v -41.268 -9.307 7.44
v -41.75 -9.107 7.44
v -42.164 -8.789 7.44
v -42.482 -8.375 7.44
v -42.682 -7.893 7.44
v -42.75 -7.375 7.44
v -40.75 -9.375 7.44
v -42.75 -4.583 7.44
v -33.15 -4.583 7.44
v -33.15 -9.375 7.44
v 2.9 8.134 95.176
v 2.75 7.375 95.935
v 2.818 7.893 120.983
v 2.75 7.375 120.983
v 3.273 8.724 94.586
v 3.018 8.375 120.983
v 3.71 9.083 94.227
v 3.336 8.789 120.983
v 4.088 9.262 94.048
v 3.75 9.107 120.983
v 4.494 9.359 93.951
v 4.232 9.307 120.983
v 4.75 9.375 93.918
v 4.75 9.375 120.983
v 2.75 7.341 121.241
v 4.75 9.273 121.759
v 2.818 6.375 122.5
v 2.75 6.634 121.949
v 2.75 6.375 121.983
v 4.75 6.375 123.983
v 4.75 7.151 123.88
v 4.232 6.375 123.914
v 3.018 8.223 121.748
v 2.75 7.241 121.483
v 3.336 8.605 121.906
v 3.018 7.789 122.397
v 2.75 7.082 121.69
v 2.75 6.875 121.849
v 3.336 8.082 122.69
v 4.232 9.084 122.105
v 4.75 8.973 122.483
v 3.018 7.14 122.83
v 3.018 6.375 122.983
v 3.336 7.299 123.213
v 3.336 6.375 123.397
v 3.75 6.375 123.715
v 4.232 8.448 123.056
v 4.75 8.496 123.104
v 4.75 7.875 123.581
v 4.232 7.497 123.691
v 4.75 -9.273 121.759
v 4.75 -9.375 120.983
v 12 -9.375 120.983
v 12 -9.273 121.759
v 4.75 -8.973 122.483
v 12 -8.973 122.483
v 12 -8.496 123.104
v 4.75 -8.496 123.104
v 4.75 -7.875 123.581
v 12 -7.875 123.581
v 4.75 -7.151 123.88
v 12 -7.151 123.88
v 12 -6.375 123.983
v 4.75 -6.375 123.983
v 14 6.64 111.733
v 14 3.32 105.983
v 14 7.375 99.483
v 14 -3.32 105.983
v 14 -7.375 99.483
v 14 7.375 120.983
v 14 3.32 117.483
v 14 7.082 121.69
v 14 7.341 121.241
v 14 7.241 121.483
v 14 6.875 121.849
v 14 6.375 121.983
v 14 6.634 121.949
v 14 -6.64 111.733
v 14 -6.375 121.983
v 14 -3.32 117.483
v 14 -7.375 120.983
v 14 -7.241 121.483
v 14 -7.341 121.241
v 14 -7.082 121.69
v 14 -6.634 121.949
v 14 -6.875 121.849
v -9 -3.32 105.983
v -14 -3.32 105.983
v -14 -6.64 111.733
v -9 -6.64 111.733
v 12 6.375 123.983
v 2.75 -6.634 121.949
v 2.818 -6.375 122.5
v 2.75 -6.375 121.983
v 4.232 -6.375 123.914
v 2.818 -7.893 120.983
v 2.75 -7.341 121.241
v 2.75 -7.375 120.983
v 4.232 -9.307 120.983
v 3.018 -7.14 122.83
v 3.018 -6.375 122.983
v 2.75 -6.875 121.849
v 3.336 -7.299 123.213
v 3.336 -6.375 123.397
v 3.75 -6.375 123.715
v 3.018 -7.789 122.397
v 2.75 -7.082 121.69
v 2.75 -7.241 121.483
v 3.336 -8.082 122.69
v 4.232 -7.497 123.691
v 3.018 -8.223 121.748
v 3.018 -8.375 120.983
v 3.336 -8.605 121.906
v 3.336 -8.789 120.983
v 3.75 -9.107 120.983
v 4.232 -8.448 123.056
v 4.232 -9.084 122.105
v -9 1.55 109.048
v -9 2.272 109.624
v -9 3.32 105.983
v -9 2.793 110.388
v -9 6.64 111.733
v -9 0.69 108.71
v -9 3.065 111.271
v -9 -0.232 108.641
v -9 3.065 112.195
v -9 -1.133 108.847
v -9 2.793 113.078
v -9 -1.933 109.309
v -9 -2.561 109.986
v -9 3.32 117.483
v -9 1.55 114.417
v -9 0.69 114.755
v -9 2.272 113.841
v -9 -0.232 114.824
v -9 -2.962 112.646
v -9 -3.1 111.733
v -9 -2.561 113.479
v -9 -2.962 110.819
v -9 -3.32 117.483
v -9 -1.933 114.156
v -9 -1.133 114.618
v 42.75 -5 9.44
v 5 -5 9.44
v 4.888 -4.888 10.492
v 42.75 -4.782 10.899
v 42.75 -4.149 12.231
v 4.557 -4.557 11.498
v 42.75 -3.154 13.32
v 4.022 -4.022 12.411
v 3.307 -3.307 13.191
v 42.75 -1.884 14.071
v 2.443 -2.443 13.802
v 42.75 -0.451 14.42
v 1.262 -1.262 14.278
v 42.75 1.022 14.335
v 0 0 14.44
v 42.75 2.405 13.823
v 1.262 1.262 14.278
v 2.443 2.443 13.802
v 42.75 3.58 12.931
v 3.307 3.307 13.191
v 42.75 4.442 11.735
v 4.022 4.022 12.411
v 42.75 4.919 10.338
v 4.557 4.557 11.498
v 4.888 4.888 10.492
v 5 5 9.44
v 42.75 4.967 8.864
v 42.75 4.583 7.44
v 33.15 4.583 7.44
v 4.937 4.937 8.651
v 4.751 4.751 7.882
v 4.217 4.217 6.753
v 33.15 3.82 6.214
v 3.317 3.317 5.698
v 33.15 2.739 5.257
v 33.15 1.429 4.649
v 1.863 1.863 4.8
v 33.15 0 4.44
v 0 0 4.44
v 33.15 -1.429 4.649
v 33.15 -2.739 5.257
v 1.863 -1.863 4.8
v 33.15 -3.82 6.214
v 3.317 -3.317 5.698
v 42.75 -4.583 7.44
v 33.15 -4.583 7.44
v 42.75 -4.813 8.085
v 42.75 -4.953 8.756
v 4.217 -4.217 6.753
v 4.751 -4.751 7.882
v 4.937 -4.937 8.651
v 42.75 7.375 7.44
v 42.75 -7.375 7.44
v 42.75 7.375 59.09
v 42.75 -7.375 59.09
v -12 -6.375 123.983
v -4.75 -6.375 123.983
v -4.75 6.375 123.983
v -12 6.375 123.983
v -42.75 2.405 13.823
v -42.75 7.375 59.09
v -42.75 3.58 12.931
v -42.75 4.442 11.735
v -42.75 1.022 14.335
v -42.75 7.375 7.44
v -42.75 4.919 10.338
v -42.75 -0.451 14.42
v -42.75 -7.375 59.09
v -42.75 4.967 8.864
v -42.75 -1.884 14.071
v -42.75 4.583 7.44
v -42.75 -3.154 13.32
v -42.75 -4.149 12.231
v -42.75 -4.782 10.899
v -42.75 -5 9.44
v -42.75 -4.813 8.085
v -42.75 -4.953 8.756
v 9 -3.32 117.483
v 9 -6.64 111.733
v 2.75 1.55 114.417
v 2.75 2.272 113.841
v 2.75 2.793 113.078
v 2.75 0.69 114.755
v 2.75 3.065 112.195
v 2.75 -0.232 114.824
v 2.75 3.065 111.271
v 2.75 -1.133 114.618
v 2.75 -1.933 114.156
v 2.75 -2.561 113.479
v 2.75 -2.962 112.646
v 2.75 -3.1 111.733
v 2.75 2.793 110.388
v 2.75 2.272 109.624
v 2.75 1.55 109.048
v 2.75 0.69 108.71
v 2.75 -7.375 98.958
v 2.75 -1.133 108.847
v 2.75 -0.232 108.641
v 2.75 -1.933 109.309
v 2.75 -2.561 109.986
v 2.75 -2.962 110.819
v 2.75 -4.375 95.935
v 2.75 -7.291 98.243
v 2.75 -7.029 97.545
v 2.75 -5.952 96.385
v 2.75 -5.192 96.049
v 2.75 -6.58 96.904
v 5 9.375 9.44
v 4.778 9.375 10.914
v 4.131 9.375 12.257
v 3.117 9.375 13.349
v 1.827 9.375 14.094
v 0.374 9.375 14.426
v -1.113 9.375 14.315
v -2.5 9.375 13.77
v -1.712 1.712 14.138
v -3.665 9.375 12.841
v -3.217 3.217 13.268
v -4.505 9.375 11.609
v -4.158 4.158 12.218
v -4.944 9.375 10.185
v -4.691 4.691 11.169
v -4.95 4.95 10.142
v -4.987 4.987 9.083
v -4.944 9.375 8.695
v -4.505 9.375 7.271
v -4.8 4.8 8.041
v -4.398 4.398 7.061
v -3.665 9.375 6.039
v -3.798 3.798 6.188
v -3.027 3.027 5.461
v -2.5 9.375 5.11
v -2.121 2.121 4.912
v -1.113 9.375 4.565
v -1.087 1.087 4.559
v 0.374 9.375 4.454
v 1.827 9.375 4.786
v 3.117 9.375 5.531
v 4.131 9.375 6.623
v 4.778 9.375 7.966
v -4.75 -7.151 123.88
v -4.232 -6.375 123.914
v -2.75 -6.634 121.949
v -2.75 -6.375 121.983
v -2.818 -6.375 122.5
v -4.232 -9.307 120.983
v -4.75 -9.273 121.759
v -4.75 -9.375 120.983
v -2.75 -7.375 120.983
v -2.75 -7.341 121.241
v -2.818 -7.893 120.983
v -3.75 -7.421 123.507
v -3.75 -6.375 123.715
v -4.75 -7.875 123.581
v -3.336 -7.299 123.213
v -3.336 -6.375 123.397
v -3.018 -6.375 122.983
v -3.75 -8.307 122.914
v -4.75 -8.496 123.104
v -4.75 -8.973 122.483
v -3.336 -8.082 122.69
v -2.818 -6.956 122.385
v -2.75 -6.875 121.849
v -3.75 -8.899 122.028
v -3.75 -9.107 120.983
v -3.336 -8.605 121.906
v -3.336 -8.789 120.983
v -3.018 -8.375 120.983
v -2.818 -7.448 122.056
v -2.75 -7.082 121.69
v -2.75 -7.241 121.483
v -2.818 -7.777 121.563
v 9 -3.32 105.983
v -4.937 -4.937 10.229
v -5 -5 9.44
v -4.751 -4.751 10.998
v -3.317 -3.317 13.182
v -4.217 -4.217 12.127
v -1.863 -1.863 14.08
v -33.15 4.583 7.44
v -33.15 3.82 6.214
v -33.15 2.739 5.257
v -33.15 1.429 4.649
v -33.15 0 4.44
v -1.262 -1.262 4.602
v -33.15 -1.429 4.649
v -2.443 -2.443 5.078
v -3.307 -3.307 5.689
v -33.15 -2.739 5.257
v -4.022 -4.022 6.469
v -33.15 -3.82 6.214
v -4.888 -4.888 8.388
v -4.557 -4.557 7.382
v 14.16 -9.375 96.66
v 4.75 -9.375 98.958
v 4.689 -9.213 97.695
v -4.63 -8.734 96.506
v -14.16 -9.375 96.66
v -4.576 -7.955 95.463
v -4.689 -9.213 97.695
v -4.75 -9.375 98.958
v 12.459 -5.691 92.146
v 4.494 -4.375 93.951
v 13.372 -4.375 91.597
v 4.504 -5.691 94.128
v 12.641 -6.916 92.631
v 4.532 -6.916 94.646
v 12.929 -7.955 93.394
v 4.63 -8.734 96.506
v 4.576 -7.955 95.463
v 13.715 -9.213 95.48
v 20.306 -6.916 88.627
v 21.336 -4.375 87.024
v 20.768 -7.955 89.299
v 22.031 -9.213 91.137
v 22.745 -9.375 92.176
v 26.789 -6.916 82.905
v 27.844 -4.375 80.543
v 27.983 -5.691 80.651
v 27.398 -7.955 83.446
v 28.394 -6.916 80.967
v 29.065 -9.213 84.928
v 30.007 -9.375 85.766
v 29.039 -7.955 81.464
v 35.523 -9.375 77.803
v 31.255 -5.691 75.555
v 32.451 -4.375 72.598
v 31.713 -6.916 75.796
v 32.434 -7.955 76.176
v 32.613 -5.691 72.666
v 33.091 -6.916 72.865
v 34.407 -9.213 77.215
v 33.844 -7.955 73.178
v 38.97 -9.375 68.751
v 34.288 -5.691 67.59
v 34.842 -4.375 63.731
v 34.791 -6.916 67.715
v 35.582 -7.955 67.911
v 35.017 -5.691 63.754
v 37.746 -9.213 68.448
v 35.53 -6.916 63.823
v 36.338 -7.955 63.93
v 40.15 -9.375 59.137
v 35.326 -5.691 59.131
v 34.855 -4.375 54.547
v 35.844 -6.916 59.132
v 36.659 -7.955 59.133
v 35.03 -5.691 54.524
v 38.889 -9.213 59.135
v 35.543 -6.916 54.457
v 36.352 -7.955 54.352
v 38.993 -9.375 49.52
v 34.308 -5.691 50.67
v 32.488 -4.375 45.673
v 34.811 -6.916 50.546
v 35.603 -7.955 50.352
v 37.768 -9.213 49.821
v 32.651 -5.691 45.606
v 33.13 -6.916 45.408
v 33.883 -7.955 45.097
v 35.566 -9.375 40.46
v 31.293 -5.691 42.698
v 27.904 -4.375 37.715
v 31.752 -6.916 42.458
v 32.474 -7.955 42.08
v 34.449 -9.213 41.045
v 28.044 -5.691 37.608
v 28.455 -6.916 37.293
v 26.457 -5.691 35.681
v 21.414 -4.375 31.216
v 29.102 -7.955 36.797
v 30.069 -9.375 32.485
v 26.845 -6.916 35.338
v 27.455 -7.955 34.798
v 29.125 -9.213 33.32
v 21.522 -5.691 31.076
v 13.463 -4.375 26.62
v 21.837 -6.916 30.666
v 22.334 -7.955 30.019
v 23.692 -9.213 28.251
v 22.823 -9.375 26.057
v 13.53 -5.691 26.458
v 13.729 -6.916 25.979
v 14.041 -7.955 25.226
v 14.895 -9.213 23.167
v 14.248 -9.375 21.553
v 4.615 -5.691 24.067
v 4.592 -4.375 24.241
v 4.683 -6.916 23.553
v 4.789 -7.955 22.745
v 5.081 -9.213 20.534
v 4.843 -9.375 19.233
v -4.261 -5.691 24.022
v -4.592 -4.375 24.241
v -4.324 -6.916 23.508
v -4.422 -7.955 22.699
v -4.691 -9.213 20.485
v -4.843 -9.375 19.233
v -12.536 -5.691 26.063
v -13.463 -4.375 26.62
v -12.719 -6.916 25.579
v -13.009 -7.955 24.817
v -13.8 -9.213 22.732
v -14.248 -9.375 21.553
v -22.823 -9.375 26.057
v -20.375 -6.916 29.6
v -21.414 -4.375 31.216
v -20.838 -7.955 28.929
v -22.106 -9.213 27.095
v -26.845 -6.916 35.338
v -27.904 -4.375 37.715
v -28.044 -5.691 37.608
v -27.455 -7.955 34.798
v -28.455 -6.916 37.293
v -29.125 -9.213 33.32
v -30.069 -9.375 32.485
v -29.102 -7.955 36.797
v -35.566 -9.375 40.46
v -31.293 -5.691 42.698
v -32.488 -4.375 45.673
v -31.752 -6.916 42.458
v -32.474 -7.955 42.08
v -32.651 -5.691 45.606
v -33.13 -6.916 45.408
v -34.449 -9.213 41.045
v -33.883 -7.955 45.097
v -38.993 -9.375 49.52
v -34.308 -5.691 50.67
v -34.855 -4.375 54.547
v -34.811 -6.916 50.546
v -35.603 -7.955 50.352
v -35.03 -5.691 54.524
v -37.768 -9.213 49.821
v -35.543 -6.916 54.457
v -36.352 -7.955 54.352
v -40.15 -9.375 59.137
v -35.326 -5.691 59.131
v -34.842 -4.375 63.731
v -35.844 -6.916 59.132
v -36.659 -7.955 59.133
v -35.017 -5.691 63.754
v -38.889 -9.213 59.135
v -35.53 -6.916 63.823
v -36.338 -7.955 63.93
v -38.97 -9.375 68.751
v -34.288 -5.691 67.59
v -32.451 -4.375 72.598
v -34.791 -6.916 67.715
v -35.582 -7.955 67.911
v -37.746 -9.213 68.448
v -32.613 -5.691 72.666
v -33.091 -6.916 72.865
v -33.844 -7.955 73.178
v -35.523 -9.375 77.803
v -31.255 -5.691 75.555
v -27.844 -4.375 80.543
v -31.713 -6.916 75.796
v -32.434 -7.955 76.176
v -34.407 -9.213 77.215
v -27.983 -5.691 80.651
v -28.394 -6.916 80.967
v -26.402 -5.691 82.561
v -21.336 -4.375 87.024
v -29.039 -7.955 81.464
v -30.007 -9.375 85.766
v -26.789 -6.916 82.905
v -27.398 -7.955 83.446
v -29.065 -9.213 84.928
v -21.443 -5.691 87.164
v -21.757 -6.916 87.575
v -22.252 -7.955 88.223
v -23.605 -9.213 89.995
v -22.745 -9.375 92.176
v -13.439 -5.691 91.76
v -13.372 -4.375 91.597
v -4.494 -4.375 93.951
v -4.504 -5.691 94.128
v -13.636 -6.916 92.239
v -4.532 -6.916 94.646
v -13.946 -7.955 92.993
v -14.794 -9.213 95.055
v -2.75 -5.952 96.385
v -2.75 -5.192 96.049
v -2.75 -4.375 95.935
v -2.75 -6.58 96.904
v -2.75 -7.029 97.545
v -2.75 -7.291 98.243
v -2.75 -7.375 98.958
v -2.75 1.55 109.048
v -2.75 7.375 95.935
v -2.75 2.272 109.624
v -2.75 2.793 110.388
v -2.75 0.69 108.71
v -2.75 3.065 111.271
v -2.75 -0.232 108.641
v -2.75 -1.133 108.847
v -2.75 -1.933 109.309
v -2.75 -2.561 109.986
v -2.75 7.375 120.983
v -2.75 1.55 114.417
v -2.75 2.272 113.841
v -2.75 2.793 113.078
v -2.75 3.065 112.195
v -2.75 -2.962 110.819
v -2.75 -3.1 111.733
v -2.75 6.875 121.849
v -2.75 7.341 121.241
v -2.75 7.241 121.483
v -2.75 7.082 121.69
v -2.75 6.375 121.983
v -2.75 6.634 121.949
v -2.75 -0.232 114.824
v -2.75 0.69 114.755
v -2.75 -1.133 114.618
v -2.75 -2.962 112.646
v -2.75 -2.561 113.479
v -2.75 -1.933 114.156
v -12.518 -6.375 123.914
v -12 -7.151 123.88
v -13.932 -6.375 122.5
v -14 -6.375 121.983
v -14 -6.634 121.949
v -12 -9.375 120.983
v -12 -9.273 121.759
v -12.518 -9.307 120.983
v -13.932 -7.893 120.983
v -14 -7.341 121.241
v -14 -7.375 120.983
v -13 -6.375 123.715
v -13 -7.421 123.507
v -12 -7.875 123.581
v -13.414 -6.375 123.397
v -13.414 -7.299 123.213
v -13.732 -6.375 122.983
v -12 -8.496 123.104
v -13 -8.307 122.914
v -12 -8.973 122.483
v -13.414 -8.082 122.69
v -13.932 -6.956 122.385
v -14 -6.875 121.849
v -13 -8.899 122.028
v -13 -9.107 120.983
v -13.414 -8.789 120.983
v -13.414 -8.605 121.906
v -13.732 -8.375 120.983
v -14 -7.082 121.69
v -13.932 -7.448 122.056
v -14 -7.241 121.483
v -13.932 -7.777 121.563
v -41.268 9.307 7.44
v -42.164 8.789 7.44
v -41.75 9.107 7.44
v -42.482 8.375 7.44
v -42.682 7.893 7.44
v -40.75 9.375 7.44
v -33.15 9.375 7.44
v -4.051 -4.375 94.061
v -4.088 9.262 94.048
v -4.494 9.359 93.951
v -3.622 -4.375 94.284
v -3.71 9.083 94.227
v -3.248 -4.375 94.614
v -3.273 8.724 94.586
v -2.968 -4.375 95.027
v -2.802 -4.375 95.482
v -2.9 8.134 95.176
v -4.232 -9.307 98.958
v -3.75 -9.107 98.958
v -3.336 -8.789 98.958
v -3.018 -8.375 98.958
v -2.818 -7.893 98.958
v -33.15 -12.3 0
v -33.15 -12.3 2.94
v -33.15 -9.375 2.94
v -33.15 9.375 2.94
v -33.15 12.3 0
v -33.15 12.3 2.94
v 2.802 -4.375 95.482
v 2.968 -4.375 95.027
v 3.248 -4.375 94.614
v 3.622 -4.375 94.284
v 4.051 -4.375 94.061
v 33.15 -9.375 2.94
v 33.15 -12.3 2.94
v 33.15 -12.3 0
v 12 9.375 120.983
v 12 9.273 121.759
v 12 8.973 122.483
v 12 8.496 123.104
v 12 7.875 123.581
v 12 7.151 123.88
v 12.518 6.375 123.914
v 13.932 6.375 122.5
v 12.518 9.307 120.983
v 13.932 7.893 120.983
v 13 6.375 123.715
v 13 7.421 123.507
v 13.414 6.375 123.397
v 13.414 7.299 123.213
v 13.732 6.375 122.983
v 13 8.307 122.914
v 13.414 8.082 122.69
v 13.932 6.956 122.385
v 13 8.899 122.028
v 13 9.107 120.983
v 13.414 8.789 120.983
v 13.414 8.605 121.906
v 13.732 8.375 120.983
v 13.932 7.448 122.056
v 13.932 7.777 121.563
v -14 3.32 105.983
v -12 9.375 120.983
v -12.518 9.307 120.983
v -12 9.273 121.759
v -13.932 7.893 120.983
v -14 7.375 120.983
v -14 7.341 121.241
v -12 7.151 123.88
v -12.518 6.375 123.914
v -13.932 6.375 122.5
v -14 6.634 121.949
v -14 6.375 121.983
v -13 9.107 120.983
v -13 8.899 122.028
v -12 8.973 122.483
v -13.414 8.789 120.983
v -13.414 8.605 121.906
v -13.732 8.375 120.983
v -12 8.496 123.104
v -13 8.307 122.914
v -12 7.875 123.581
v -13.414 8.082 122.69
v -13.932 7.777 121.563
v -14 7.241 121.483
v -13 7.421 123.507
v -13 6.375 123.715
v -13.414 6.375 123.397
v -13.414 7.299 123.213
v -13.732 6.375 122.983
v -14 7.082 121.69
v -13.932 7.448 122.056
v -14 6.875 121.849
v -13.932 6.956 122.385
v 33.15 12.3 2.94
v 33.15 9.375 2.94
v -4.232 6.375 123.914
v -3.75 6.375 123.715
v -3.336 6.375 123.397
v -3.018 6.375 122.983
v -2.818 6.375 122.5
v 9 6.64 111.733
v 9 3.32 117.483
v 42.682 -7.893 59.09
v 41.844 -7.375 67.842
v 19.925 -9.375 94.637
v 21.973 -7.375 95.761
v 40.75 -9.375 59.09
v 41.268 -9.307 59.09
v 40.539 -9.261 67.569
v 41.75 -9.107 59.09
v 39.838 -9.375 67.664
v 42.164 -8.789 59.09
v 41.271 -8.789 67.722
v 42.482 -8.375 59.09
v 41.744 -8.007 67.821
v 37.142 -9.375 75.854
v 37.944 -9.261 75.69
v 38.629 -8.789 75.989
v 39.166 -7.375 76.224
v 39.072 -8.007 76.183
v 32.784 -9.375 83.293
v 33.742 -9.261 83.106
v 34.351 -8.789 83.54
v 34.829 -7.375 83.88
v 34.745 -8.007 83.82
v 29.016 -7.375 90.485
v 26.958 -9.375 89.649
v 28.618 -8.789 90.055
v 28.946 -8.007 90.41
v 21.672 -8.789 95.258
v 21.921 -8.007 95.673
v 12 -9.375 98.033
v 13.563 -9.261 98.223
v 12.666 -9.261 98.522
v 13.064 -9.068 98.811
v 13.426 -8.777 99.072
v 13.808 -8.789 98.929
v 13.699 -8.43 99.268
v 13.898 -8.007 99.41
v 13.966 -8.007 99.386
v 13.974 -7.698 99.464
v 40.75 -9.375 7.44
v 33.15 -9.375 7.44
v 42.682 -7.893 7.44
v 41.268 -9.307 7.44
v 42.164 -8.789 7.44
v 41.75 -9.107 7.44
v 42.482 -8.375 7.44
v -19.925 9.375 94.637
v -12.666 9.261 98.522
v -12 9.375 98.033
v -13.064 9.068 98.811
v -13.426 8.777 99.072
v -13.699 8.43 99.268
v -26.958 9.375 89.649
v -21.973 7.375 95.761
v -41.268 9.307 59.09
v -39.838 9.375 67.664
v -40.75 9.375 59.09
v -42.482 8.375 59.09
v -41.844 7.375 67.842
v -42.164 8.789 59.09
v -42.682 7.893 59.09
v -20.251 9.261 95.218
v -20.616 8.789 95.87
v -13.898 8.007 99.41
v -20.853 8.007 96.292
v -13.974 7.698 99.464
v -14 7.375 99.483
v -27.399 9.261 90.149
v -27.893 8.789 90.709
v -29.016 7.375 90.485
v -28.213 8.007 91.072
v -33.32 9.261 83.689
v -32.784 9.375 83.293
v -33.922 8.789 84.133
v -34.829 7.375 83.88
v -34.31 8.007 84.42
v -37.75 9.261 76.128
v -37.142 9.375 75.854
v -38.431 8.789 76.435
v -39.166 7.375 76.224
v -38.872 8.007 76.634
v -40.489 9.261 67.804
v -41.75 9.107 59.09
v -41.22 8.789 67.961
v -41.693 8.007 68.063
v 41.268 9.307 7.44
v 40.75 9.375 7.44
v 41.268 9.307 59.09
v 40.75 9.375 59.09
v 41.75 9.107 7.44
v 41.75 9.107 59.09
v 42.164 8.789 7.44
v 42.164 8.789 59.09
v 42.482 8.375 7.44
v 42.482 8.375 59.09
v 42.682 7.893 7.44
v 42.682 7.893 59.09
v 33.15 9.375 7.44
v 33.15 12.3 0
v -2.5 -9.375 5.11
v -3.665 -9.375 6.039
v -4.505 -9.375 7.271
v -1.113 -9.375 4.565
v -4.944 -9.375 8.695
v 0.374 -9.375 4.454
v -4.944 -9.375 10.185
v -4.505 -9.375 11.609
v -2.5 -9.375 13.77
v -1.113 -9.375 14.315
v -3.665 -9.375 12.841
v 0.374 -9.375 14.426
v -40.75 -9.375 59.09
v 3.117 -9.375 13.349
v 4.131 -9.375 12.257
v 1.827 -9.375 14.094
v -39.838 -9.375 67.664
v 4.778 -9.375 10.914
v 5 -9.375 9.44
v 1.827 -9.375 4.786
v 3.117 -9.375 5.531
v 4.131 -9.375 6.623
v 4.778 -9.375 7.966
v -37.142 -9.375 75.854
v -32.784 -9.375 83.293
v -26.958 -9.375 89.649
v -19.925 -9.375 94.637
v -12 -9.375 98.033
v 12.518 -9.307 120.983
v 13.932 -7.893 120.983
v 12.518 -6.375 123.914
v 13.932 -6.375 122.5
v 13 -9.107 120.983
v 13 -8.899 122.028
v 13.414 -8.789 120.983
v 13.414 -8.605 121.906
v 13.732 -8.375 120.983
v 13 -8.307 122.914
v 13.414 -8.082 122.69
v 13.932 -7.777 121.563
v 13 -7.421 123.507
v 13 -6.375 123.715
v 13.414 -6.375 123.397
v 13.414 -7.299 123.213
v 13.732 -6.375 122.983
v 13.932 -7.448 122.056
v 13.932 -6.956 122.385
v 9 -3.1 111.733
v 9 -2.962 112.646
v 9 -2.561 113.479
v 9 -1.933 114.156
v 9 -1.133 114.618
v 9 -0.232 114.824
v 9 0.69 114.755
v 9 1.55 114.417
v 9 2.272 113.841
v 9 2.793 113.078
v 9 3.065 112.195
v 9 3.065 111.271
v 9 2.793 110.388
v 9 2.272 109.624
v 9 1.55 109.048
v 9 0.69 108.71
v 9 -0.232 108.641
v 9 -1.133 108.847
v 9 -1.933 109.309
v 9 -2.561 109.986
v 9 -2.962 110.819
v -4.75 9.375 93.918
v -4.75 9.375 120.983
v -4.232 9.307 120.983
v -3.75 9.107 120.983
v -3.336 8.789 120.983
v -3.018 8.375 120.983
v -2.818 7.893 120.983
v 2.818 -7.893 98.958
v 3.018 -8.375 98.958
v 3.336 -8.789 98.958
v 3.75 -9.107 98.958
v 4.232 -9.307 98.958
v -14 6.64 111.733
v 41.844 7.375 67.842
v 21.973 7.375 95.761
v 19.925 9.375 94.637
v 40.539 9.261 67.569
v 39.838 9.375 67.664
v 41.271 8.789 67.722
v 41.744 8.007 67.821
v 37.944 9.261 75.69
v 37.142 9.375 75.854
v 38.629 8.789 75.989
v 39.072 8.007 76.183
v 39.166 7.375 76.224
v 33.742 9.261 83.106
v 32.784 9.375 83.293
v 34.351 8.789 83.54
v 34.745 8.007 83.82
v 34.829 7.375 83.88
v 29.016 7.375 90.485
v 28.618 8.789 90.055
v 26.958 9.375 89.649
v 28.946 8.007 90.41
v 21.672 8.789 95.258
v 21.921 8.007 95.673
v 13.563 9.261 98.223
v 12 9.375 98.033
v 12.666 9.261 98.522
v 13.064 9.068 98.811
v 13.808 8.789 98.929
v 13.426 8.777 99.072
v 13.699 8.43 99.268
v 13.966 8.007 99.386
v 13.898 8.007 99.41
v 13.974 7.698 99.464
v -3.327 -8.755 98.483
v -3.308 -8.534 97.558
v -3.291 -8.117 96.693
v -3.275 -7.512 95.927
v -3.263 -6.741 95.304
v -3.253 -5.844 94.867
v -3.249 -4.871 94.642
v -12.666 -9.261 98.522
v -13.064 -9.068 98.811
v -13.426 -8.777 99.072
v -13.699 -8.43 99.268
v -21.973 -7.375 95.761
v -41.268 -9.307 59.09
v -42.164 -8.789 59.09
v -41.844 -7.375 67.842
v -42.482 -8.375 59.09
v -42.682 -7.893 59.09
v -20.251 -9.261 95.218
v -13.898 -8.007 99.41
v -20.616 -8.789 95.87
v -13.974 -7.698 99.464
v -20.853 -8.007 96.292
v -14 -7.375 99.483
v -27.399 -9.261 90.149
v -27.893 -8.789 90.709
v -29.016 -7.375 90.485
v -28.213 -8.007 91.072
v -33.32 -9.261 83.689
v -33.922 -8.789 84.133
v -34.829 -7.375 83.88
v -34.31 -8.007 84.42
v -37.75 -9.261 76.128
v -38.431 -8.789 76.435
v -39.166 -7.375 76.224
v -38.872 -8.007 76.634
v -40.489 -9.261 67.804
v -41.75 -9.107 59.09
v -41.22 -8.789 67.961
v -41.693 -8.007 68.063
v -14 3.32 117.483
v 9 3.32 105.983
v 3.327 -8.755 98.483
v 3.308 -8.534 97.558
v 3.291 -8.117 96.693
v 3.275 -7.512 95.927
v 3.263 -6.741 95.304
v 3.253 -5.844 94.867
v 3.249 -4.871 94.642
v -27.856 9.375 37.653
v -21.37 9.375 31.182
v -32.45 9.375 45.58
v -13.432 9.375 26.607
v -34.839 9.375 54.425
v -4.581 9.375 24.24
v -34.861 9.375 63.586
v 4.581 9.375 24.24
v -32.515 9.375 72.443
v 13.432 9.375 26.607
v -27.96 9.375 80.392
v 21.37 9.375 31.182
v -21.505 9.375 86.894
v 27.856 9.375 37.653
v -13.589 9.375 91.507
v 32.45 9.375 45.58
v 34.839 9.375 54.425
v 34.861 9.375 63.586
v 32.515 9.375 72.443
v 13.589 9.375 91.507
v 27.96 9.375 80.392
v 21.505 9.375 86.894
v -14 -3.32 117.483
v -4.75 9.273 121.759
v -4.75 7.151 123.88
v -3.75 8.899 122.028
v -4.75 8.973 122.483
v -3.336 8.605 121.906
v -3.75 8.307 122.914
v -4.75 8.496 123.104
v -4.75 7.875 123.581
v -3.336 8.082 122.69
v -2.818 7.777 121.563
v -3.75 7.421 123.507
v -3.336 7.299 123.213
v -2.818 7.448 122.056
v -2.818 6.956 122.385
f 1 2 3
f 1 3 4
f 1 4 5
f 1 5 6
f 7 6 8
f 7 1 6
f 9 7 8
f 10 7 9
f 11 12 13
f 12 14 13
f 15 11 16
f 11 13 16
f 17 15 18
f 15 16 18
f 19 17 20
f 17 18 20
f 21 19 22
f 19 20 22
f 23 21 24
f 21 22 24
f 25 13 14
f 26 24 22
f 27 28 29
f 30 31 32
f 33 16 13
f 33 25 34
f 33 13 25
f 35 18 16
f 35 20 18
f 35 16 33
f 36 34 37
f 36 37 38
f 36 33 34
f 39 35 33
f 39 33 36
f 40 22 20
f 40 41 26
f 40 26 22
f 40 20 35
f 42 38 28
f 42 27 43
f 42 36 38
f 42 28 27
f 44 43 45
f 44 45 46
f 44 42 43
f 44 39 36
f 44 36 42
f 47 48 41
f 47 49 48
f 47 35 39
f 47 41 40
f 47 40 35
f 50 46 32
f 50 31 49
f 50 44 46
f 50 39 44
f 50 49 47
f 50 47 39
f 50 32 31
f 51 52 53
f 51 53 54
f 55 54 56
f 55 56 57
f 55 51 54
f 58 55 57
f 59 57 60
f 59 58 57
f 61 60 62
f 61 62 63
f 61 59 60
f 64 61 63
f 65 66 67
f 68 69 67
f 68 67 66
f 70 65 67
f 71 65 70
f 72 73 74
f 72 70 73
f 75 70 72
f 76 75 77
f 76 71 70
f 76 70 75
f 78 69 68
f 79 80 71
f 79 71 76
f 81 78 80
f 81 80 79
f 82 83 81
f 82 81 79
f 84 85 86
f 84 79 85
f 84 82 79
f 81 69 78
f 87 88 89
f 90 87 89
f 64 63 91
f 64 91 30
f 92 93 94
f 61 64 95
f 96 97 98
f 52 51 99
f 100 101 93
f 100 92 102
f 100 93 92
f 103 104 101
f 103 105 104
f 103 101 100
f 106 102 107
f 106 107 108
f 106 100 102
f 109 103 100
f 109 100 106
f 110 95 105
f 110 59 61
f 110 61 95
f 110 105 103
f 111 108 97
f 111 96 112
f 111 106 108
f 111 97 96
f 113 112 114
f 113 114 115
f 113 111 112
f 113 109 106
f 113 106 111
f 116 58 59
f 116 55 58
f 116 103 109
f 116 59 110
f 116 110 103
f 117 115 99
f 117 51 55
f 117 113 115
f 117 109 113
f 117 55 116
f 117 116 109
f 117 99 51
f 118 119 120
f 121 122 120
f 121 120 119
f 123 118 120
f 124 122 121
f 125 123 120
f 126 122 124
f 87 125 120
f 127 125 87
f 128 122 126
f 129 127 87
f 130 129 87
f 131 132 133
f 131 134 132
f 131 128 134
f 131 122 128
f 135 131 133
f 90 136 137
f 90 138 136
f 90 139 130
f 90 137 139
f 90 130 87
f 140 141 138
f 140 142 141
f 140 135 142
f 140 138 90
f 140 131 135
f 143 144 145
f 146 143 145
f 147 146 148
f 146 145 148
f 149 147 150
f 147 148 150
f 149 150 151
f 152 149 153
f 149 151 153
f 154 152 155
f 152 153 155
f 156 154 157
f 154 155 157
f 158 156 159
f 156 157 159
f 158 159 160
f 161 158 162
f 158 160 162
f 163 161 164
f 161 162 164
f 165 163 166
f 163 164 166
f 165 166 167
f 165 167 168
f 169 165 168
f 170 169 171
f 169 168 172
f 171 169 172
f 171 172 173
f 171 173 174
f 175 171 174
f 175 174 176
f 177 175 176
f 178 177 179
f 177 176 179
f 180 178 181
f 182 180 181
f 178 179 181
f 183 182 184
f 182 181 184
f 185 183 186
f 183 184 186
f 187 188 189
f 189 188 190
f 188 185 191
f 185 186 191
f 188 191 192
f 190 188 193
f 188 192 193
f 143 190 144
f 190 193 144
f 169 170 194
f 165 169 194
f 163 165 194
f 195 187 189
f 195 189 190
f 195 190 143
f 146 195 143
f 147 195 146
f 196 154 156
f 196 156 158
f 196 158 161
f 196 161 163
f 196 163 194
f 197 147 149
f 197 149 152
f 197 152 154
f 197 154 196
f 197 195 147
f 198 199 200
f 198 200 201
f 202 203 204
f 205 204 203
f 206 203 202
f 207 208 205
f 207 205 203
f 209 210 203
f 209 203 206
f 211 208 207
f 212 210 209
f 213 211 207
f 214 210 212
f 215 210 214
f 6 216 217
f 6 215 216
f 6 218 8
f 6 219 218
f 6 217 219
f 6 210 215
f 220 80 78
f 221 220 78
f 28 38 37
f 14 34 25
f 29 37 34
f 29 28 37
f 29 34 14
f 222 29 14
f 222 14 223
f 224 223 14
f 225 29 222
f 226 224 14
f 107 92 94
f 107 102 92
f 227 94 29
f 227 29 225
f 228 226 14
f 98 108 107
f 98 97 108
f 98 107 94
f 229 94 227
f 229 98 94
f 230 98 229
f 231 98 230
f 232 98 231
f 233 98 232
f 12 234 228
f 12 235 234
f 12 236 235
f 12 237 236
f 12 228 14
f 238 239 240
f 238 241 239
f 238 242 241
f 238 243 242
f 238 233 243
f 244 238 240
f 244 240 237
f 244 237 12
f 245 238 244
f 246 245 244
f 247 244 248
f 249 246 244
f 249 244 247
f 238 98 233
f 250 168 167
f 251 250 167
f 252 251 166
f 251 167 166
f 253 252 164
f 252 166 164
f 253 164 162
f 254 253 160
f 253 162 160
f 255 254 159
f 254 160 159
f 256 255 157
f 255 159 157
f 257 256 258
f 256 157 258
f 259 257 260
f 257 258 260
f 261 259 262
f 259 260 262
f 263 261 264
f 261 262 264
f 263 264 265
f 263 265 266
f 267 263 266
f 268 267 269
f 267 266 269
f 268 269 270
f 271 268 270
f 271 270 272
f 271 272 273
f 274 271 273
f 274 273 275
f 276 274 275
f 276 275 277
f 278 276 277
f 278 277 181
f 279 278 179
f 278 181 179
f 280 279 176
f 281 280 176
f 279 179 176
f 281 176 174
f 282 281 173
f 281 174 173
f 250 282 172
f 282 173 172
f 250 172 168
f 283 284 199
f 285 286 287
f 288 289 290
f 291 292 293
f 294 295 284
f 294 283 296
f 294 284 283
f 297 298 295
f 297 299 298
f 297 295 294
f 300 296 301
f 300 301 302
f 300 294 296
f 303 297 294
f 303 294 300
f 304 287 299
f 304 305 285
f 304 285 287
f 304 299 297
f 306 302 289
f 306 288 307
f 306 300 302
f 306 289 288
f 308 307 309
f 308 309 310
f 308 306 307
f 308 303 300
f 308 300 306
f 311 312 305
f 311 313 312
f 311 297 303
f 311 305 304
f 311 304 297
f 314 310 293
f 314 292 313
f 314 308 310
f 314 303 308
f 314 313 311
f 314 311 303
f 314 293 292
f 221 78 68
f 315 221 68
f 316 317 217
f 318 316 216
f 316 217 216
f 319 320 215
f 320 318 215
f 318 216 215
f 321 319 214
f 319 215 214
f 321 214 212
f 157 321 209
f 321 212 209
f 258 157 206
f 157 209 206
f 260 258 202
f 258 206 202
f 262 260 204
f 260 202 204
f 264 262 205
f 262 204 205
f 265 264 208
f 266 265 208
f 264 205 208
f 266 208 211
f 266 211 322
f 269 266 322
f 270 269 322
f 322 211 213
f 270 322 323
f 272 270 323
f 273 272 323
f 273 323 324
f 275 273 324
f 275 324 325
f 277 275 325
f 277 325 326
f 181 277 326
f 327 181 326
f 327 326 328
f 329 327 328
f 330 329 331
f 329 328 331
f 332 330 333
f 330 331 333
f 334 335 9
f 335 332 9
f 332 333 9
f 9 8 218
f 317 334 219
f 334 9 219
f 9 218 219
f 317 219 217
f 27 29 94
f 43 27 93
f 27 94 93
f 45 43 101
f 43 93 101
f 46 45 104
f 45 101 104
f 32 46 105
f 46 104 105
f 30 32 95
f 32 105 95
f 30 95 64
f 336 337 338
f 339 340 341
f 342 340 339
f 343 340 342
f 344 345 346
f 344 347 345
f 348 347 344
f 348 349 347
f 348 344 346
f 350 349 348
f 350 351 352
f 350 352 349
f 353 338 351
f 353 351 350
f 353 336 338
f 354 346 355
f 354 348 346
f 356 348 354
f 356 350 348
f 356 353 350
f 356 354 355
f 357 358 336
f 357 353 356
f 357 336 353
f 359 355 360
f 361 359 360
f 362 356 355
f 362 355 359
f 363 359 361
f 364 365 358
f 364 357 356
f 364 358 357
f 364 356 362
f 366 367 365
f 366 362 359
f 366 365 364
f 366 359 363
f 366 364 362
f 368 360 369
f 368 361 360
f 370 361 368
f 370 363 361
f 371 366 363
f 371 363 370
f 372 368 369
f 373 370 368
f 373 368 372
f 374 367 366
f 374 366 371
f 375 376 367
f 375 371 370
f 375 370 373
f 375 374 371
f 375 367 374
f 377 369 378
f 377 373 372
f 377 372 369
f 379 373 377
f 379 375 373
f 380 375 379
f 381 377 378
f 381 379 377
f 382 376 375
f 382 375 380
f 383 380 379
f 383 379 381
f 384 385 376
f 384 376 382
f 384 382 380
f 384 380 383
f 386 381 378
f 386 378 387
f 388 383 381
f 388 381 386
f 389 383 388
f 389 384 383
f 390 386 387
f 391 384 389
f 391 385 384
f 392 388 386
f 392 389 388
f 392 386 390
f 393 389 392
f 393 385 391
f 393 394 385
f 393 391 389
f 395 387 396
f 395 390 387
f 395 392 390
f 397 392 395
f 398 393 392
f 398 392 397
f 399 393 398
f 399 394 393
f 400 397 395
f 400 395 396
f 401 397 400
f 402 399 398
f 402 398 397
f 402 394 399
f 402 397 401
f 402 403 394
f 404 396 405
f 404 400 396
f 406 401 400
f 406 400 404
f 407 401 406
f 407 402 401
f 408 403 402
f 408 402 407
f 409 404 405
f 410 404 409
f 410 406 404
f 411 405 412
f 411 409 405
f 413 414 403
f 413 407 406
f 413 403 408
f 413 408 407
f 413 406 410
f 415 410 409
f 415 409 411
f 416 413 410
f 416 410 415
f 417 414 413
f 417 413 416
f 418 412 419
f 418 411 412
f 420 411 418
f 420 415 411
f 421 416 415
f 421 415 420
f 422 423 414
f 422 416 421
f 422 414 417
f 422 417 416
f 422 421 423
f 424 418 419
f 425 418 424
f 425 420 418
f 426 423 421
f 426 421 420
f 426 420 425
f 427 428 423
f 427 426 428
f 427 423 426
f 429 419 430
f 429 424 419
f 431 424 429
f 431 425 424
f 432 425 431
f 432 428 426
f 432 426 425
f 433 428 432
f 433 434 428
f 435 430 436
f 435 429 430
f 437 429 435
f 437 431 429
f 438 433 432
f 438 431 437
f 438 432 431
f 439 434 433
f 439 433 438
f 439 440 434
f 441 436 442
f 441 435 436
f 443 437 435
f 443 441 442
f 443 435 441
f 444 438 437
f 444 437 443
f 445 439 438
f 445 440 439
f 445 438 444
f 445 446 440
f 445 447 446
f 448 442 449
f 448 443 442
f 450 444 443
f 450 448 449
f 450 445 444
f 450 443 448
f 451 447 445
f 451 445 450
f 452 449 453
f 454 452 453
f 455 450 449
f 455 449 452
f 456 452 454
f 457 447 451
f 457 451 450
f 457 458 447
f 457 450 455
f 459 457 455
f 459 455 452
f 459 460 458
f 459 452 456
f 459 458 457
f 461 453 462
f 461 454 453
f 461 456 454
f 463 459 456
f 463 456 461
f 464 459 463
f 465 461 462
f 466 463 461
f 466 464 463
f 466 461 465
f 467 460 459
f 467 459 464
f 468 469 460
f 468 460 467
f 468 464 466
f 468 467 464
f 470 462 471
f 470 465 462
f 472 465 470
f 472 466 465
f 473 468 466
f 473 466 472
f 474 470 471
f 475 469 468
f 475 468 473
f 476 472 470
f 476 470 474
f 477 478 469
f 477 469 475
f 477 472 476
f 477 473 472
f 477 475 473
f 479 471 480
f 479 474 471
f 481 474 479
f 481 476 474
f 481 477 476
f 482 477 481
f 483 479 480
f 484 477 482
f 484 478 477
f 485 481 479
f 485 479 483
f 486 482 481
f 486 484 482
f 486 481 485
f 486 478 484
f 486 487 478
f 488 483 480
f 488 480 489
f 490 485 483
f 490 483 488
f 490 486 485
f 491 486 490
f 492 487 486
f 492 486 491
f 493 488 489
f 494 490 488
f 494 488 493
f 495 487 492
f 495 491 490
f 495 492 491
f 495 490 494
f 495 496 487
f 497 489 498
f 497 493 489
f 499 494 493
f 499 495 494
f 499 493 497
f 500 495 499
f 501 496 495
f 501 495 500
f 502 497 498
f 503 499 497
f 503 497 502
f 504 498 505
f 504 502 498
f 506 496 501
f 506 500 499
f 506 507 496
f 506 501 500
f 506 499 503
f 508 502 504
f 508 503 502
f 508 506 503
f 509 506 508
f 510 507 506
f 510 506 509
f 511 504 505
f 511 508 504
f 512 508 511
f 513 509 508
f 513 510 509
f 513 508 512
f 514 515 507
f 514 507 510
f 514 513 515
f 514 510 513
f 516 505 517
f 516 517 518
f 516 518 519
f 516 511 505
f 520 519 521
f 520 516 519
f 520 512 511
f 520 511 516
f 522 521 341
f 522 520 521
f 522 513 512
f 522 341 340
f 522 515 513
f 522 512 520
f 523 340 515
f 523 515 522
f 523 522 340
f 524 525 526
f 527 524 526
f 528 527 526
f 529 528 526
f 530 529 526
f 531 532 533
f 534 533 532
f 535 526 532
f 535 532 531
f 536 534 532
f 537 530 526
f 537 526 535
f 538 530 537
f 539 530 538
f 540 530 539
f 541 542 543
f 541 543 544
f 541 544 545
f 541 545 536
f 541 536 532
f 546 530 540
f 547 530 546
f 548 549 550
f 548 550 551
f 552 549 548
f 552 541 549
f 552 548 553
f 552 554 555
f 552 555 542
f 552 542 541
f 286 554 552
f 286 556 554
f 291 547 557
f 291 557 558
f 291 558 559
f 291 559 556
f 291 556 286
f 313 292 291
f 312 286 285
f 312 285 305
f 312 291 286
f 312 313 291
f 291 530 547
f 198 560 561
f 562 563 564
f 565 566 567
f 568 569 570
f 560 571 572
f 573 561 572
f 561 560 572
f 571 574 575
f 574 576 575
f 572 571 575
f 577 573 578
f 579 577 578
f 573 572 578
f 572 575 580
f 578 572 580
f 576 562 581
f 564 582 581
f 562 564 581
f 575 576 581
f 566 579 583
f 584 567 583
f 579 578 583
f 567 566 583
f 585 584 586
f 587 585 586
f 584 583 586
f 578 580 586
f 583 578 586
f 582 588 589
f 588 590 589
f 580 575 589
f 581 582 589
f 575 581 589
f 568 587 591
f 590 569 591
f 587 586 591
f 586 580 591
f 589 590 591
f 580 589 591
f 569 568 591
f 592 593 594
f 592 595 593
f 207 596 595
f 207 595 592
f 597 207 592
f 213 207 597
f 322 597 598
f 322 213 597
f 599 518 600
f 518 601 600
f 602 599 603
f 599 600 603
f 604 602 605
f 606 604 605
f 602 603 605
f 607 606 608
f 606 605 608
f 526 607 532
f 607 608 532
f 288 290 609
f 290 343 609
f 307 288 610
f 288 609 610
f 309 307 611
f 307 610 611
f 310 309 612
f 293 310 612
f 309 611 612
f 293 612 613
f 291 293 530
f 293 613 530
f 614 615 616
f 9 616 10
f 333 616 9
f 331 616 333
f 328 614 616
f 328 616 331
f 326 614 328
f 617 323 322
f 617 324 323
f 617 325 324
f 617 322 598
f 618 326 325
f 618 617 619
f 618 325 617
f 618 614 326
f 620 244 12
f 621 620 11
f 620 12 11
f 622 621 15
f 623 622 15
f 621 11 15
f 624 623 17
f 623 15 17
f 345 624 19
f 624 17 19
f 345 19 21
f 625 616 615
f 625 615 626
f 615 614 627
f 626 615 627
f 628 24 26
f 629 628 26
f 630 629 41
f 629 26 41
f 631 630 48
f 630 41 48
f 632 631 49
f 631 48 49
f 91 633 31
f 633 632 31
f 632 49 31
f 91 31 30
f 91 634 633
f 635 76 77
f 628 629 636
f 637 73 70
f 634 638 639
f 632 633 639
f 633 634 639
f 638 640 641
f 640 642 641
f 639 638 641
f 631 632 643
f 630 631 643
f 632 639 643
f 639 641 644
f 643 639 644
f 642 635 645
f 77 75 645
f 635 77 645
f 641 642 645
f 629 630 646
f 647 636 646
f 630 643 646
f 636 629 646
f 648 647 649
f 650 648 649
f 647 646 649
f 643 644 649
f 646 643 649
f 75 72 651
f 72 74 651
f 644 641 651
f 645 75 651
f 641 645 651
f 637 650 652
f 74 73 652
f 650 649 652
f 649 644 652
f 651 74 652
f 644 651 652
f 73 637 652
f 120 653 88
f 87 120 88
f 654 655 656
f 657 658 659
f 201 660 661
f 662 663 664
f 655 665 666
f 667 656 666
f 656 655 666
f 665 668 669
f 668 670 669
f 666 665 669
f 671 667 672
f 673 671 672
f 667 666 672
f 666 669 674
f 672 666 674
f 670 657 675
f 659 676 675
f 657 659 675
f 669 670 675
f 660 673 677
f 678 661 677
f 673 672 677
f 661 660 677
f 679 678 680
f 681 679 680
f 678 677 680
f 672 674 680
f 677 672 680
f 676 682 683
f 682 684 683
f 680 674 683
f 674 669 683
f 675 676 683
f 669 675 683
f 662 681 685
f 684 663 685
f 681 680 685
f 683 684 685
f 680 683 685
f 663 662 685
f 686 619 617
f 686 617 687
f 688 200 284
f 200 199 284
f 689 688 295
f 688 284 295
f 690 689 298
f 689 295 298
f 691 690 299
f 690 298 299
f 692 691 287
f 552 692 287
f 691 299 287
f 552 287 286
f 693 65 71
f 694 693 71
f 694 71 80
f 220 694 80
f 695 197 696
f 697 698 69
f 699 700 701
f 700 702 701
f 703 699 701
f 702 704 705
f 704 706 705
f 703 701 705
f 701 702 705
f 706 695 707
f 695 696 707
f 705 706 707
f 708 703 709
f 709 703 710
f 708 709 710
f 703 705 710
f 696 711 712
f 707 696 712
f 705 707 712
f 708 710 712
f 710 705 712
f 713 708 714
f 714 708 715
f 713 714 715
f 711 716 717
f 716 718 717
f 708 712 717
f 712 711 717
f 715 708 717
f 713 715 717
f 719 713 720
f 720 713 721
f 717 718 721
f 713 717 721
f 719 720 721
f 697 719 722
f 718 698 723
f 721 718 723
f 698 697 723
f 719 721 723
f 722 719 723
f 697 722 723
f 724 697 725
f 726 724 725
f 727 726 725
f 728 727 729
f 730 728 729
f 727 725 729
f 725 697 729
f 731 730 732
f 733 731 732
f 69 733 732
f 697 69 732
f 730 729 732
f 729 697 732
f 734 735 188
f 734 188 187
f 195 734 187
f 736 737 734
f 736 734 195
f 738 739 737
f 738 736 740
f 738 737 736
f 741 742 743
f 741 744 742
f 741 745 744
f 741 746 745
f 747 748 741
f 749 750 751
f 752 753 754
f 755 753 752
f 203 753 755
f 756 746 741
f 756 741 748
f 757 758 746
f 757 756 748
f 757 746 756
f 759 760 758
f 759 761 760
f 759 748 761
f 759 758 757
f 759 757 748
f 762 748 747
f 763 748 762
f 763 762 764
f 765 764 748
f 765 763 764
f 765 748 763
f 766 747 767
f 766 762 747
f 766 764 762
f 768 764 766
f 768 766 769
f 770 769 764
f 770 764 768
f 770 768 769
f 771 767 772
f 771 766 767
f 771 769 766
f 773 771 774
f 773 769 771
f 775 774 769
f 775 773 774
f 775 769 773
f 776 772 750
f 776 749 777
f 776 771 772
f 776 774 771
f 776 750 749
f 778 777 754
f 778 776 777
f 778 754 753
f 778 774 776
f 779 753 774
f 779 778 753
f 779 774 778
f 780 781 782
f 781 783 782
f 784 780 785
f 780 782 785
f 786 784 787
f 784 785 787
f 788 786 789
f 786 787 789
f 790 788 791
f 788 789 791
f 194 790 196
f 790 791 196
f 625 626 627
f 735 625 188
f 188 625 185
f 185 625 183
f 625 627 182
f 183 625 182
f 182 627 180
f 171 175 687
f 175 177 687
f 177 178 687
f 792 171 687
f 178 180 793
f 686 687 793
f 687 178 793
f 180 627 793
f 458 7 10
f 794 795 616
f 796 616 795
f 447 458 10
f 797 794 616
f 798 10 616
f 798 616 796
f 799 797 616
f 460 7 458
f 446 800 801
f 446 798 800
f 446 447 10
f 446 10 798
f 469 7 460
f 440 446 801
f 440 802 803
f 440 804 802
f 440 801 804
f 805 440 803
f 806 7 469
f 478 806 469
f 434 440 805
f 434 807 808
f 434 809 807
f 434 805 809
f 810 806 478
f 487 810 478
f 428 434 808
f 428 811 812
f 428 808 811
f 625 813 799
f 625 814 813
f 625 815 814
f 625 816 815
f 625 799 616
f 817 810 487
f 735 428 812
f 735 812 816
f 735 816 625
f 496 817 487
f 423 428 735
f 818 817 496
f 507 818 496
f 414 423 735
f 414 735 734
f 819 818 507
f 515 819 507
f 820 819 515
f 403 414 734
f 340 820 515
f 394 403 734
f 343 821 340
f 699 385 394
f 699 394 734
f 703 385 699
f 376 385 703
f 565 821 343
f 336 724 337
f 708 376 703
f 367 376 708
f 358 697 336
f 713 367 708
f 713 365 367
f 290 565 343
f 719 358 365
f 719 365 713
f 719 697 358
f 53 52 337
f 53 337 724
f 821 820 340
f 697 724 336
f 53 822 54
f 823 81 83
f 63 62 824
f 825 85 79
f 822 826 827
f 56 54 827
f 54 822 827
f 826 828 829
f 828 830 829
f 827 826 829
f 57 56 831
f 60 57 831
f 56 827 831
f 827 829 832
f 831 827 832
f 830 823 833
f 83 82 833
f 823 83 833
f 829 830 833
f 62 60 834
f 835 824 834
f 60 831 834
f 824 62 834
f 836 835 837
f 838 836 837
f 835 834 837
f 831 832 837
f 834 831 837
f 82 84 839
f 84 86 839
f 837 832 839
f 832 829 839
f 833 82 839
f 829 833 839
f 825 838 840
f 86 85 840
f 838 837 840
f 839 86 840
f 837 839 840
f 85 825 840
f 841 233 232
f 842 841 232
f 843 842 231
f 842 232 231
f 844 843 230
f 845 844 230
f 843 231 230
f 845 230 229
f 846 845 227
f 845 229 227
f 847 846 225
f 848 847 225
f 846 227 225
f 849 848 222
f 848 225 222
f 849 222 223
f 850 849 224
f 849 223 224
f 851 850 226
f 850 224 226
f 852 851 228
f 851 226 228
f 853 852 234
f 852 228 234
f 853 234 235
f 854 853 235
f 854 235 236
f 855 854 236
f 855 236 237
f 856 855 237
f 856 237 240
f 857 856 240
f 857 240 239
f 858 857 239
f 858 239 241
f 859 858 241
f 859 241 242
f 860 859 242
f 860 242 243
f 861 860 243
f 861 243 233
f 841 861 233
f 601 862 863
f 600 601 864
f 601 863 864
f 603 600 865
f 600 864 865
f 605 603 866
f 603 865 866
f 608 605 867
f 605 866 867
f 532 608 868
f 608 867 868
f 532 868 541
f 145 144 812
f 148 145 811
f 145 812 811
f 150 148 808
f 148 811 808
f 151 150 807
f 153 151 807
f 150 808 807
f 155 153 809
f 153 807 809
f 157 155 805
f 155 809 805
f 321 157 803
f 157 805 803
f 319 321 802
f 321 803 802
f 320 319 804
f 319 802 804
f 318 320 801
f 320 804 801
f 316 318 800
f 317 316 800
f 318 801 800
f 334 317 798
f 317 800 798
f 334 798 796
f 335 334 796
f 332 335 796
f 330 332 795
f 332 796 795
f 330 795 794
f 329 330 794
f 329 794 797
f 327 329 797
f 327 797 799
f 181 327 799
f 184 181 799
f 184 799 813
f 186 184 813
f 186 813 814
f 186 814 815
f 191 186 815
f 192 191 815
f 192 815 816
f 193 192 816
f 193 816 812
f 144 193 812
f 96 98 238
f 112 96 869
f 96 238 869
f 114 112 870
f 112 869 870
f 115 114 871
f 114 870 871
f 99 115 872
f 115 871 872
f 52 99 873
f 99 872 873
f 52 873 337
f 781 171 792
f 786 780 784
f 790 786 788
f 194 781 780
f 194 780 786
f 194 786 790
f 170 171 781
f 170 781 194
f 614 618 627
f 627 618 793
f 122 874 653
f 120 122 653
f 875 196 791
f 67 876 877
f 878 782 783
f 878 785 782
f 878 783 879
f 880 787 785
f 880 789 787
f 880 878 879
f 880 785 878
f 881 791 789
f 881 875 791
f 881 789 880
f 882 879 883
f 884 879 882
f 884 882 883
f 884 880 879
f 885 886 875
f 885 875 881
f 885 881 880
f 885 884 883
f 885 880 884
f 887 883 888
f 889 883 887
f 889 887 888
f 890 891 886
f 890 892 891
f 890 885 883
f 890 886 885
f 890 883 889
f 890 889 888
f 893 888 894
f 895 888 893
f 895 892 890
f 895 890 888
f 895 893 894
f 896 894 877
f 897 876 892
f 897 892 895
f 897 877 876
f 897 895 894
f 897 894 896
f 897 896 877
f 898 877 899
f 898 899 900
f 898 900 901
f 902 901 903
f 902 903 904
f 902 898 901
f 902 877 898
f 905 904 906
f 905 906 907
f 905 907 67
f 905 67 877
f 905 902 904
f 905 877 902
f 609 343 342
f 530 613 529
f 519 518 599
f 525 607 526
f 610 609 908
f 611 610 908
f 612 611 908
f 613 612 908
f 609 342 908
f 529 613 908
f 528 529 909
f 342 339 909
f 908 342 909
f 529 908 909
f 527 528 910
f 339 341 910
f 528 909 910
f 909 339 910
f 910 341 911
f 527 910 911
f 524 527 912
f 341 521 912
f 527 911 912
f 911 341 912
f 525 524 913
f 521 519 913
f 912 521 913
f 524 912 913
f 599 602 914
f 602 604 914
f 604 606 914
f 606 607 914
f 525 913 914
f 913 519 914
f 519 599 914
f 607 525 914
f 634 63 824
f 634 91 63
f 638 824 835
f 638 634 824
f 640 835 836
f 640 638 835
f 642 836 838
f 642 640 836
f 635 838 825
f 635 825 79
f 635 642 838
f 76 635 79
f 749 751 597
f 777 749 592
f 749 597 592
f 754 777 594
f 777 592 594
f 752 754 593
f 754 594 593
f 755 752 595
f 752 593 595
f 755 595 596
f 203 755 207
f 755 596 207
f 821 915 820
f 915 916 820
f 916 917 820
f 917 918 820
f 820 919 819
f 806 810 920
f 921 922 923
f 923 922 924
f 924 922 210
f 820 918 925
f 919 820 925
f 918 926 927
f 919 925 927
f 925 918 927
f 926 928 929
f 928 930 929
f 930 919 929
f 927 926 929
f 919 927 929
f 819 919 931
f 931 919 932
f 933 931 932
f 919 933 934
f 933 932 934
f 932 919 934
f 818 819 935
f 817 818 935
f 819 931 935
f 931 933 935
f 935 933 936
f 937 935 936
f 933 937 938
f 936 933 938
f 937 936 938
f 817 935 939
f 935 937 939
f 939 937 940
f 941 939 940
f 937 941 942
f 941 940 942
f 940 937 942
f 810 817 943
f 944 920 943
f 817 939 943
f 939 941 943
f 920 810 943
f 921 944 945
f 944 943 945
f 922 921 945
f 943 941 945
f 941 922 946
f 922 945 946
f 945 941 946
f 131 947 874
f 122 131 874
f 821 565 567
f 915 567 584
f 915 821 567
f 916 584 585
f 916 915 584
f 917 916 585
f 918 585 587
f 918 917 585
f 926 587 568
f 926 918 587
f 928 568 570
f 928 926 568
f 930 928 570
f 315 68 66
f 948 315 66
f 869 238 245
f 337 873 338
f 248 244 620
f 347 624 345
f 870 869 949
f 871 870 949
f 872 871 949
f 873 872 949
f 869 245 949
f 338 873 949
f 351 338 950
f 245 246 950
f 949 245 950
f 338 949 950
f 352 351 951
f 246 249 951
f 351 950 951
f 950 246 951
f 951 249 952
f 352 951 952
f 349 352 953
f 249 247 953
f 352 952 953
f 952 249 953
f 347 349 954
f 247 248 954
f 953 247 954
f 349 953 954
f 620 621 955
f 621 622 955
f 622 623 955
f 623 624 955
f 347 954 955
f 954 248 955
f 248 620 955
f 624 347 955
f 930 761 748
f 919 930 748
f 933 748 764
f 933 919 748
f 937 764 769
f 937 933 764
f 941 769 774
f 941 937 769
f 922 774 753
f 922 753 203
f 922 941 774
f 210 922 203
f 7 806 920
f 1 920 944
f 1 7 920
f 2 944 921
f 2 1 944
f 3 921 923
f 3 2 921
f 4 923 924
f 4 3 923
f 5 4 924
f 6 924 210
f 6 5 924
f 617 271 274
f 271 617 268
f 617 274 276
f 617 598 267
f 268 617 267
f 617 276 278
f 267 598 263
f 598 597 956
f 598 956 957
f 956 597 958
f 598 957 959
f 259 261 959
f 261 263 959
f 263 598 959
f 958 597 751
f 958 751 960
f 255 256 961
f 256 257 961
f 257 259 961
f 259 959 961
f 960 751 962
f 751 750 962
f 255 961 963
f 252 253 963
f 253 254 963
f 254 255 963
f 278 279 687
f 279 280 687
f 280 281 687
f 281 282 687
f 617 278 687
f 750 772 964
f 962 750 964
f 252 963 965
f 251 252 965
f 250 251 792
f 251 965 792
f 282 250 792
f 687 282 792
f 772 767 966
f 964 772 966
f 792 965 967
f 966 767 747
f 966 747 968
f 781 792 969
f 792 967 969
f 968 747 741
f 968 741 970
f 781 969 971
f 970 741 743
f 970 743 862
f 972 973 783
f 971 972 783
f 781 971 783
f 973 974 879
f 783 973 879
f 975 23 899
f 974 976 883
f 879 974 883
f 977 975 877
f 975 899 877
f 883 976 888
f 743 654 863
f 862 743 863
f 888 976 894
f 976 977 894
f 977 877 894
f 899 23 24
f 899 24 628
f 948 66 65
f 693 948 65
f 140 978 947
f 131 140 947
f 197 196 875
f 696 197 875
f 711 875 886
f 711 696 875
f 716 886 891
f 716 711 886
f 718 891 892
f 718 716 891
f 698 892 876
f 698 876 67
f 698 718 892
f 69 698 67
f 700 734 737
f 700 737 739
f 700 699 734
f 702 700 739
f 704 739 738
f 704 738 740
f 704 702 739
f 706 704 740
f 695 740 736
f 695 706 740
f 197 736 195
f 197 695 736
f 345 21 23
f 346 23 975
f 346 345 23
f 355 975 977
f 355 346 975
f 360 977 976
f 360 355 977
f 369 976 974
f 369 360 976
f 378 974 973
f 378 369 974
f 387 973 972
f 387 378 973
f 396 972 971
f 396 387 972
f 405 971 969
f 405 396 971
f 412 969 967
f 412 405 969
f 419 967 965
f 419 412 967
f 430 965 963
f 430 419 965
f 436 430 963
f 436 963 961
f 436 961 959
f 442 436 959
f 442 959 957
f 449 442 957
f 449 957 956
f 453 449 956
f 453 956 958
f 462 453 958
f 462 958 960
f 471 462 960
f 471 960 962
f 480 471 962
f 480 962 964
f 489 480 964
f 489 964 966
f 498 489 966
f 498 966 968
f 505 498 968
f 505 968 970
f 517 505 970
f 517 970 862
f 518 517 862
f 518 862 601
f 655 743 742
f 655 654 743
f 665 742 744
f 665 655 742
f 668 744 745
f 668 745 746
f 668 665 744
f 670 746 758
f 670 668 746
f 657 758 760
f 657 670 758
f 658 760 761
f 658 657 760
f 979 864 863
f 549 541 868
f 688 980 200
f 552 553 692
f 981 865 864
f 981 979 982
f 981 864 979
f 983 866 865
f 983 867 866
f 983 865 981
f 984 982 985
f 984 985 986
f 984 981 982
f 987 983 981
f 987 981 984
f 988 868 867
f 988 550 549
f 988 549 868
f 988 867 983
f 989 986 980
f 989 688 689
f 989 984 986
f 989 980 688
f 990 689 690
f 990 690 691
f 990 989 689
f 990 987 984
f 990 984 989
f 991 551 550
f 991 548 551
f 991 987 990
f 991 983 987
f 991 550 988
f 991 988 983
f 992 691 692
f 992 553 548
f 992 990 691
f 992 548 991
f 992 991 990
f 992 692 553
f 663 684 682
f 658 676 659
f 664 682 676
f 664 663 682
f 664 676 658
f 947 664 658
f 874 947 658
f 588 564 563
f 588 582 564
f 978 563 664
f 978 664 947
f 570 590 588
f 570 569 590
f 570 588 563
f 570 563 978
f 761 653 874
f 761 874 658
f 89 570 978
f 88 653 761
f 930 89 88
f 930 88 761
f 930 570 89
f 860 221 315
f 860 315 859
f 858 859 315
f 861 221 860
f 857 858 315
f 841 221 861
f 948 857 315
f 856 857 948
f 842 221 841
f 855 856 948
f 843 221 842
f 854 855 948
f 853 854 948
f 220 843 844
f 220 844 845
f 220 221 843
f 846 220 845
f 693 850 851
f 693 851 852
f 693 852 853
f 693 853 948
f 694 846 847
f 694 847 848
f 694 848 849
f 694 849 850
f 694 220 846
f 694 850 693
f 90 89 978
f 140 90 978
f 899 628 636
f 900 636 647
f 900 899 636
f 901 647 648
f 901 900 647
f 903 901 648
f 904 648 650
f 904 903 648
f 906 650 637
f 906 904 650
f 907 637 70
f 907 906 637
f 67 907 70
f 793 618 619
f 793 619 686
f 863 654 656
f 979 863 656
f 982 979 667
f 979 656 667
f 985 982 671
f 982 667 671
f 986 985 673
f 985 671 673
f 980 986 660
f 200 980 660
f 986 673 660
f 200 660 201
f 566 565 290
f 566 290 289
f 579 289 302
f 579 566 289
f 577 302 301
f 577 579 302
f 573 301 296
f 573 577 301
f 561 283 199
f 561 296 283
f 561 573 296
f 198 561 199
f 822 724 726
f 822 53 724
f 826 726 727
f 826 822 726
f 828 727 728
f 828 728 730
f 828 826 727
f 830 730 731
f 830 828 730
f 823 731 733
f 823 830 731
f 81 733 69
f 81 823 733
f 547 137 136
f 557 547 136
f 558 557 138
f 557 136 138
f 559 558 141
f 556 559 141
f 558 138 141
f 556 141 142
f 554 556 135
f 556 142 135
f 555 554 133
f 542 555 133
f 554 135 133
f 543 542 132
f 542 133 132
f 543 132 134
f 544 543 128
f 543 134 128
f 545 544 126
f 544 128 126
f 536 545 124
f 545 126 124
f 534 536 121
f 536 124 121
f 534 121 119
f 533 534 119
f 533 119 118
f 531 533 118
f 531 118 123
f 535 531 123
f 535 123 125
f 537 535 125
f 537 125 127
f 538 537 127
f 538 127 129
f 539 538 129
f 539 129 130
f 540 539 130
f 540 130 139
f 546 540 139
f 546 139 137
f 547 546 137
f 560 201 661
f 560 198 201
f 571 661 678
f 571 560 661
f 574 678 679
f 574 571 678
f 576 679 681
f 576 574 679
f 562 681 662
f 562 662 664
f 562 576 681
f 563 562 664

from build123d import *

# Parameters (mm, degrees)
F0_W      = 66.3
F0_H      = 24.6
F1_DEPTH  = 2.94
F2_W      = 66.3
F2_H      = 18.75
F3_DEPTH  = 4.5
F5_DEPTH  = 18.75
F7_DEPTH  = 5
F9_DEPTH  = 5
F10_R     = 3.1
F11_DEPTH = 51.751
F12_R     = 5
F13_DEPTH = 21.676
F14_R     = 5
F15_DEPTH = 85.501
F16_R     = 5
F17_R     = 3
F18_R     = 2


with BuildPart() as f1:
    # F0 (on Top) → F1 (new body)
    with BuildSketch(Plane.XY):
        Rectangle(F0_W, F0_H)
    extrude(amount=F1_DEPTH)

    # F2 (on face) → F3 (join)
    with BuildSketch(Plane.XY.offset(2.94)):
        Rectangle(F2_W, F2_H)
    extrude(amount=F3_DEPTH)

    # F4 (on face) → F5 (join, through all)
    with BuildSketch(Plane.XZ.offset(9.375)):
        with BuildLine():
            ThreePointArc((2.75, 94.13226), (0, 23.94), (-2.75, 94.13226))
            Line((-2.75, 94.13226), (-2.75, 123.982605))
            Line((-2.75, 123.982605), (-14, 123.982605))
            Line((-14, 123.982605), (-14, 99.482605))
            ThreePointArc((-14, 99.482605), (-34.828598, 83.879741), (-42.75, 59.09))
            Line((-42.75, 59.09), (-42.75, 7.44))
            Line((-42.75, 7.44), (42.75, 7.44))
            Line((42.75, 7.44), (42.75, 59.09))
            ThreePointArc((42.75, 59.09), (34.828598, 83.879741), (14, 99.482605))
            Line((14, 99.482605), (14, 123.982605))
            Line((14, 123.982605), (2.75, 123.982605))
            Line((2.75, 123.982605), (2.75, 94.13226))
        make_face()
    extrude(amount=-F5_DEPTH)

    # F6 (on face) → F7 (cut)
    with BuildSketch(Plane(origin=(-14, 0, 0), x_dir=(0, -1, 0), z_dir=(-1, 0, 0))):
        Polygon((-3.319764, 105.982605), (3.319764, 105.982605), (6.639528, 111.732605), (3.319764, 117.482605), (-3.319764, 117.482605), (-6.639528, 111.732605), align=None)
    extrude(amount=-F7_DEPTH, mode=Mode.SUBTRACT)

    # F8 (on face) → F9 (cut)
    with BuildSketch(Plane.YZ.offset(14)):
        Polygon((-6.639528, 111.732605), (-3.319764, 105.982605), (3.319764, 105.982605), (6.639528, 111.732605), (3.319764, 117.482605), (-3.319764, 117.482605), align=None)
    extrude(amount=-F9_DEPTH, mode=Mode.SUBTRACT)

    # F10 (on face) → F11 (cut, through all)
    with BuildSketch(Plane(origin=(-9, 0, 0), x_dir=(0, -1, 0), z_dir=(-1, 0, 0))):
        with Locations((0, 111.732605)):
            Circle(F10_R)
    extrude(amount=-F11_DEPTH, mode=Mode.SUBTRACT)

    # F12 (on face) → F13 (cut, through all)
    with BuildSketch(Plane.XZ.offset(9.375)):
        with Locations((0, 9.44)):
            Circle(F12_R)
    extrude(amount=-F13_DEPTH, mode=Mode.SUBTRACT)

    # F14 (on face) → F15 (cut, through all)
    with BuildSketch(Plane(origin=(-42.75, 0, 0), x_dir=(0, -1, 0), z_dir=(-1, 0, 0))):
        with Locations((0, 9.44)):
            Circle(F14_R)
    extrude(amount=-F15_DEPTH, mode=Mode.SUBTRACT)

    # F16
    f16_edges = [f1.edges().sort_by_distance(p)[0] for p in [
        (0, -9.375, 23.94),
    ]]
    fillet(f16_edges, radius=F16_R)

    # F17
    f17_edges = [f1.edges().sort_by_distance(p)[0] for p in [
        (8.375, -9.375, 123.982605),
        (-8.375, -9.375, 123.982605),
        (8.375, 9.375, 123.982605),
        (-8.375, 9.375, 123.982605),
    ]]
    fillet(f17_edges, radius=F17_R)

    # F18
    f18_edges = [f1.edges().sort_by_distance(p)[0] for p in [
        (42.75, -9.375, 33.265),
        (-42.75, -9.375, 33.265),
        (42.75, 9.375, 33.265),
        (-42.75, 9.375, 33.265),
        (14, -9.375, 110.232605),
        (14, 9.375, 110.232605),
        (-14, -9.375, 110.232605),
        (-14, 9.375, 110.232605),
        (-2.75, 2.5, 94.13226),
        (2.75, 2.5, 94.13226),
        (-2.75, 0, 123.982605),
        (2.75, 0, 123.982605),
    ]]
    fillet(f18_edges, radius=F18_R)


solid = f1.part
